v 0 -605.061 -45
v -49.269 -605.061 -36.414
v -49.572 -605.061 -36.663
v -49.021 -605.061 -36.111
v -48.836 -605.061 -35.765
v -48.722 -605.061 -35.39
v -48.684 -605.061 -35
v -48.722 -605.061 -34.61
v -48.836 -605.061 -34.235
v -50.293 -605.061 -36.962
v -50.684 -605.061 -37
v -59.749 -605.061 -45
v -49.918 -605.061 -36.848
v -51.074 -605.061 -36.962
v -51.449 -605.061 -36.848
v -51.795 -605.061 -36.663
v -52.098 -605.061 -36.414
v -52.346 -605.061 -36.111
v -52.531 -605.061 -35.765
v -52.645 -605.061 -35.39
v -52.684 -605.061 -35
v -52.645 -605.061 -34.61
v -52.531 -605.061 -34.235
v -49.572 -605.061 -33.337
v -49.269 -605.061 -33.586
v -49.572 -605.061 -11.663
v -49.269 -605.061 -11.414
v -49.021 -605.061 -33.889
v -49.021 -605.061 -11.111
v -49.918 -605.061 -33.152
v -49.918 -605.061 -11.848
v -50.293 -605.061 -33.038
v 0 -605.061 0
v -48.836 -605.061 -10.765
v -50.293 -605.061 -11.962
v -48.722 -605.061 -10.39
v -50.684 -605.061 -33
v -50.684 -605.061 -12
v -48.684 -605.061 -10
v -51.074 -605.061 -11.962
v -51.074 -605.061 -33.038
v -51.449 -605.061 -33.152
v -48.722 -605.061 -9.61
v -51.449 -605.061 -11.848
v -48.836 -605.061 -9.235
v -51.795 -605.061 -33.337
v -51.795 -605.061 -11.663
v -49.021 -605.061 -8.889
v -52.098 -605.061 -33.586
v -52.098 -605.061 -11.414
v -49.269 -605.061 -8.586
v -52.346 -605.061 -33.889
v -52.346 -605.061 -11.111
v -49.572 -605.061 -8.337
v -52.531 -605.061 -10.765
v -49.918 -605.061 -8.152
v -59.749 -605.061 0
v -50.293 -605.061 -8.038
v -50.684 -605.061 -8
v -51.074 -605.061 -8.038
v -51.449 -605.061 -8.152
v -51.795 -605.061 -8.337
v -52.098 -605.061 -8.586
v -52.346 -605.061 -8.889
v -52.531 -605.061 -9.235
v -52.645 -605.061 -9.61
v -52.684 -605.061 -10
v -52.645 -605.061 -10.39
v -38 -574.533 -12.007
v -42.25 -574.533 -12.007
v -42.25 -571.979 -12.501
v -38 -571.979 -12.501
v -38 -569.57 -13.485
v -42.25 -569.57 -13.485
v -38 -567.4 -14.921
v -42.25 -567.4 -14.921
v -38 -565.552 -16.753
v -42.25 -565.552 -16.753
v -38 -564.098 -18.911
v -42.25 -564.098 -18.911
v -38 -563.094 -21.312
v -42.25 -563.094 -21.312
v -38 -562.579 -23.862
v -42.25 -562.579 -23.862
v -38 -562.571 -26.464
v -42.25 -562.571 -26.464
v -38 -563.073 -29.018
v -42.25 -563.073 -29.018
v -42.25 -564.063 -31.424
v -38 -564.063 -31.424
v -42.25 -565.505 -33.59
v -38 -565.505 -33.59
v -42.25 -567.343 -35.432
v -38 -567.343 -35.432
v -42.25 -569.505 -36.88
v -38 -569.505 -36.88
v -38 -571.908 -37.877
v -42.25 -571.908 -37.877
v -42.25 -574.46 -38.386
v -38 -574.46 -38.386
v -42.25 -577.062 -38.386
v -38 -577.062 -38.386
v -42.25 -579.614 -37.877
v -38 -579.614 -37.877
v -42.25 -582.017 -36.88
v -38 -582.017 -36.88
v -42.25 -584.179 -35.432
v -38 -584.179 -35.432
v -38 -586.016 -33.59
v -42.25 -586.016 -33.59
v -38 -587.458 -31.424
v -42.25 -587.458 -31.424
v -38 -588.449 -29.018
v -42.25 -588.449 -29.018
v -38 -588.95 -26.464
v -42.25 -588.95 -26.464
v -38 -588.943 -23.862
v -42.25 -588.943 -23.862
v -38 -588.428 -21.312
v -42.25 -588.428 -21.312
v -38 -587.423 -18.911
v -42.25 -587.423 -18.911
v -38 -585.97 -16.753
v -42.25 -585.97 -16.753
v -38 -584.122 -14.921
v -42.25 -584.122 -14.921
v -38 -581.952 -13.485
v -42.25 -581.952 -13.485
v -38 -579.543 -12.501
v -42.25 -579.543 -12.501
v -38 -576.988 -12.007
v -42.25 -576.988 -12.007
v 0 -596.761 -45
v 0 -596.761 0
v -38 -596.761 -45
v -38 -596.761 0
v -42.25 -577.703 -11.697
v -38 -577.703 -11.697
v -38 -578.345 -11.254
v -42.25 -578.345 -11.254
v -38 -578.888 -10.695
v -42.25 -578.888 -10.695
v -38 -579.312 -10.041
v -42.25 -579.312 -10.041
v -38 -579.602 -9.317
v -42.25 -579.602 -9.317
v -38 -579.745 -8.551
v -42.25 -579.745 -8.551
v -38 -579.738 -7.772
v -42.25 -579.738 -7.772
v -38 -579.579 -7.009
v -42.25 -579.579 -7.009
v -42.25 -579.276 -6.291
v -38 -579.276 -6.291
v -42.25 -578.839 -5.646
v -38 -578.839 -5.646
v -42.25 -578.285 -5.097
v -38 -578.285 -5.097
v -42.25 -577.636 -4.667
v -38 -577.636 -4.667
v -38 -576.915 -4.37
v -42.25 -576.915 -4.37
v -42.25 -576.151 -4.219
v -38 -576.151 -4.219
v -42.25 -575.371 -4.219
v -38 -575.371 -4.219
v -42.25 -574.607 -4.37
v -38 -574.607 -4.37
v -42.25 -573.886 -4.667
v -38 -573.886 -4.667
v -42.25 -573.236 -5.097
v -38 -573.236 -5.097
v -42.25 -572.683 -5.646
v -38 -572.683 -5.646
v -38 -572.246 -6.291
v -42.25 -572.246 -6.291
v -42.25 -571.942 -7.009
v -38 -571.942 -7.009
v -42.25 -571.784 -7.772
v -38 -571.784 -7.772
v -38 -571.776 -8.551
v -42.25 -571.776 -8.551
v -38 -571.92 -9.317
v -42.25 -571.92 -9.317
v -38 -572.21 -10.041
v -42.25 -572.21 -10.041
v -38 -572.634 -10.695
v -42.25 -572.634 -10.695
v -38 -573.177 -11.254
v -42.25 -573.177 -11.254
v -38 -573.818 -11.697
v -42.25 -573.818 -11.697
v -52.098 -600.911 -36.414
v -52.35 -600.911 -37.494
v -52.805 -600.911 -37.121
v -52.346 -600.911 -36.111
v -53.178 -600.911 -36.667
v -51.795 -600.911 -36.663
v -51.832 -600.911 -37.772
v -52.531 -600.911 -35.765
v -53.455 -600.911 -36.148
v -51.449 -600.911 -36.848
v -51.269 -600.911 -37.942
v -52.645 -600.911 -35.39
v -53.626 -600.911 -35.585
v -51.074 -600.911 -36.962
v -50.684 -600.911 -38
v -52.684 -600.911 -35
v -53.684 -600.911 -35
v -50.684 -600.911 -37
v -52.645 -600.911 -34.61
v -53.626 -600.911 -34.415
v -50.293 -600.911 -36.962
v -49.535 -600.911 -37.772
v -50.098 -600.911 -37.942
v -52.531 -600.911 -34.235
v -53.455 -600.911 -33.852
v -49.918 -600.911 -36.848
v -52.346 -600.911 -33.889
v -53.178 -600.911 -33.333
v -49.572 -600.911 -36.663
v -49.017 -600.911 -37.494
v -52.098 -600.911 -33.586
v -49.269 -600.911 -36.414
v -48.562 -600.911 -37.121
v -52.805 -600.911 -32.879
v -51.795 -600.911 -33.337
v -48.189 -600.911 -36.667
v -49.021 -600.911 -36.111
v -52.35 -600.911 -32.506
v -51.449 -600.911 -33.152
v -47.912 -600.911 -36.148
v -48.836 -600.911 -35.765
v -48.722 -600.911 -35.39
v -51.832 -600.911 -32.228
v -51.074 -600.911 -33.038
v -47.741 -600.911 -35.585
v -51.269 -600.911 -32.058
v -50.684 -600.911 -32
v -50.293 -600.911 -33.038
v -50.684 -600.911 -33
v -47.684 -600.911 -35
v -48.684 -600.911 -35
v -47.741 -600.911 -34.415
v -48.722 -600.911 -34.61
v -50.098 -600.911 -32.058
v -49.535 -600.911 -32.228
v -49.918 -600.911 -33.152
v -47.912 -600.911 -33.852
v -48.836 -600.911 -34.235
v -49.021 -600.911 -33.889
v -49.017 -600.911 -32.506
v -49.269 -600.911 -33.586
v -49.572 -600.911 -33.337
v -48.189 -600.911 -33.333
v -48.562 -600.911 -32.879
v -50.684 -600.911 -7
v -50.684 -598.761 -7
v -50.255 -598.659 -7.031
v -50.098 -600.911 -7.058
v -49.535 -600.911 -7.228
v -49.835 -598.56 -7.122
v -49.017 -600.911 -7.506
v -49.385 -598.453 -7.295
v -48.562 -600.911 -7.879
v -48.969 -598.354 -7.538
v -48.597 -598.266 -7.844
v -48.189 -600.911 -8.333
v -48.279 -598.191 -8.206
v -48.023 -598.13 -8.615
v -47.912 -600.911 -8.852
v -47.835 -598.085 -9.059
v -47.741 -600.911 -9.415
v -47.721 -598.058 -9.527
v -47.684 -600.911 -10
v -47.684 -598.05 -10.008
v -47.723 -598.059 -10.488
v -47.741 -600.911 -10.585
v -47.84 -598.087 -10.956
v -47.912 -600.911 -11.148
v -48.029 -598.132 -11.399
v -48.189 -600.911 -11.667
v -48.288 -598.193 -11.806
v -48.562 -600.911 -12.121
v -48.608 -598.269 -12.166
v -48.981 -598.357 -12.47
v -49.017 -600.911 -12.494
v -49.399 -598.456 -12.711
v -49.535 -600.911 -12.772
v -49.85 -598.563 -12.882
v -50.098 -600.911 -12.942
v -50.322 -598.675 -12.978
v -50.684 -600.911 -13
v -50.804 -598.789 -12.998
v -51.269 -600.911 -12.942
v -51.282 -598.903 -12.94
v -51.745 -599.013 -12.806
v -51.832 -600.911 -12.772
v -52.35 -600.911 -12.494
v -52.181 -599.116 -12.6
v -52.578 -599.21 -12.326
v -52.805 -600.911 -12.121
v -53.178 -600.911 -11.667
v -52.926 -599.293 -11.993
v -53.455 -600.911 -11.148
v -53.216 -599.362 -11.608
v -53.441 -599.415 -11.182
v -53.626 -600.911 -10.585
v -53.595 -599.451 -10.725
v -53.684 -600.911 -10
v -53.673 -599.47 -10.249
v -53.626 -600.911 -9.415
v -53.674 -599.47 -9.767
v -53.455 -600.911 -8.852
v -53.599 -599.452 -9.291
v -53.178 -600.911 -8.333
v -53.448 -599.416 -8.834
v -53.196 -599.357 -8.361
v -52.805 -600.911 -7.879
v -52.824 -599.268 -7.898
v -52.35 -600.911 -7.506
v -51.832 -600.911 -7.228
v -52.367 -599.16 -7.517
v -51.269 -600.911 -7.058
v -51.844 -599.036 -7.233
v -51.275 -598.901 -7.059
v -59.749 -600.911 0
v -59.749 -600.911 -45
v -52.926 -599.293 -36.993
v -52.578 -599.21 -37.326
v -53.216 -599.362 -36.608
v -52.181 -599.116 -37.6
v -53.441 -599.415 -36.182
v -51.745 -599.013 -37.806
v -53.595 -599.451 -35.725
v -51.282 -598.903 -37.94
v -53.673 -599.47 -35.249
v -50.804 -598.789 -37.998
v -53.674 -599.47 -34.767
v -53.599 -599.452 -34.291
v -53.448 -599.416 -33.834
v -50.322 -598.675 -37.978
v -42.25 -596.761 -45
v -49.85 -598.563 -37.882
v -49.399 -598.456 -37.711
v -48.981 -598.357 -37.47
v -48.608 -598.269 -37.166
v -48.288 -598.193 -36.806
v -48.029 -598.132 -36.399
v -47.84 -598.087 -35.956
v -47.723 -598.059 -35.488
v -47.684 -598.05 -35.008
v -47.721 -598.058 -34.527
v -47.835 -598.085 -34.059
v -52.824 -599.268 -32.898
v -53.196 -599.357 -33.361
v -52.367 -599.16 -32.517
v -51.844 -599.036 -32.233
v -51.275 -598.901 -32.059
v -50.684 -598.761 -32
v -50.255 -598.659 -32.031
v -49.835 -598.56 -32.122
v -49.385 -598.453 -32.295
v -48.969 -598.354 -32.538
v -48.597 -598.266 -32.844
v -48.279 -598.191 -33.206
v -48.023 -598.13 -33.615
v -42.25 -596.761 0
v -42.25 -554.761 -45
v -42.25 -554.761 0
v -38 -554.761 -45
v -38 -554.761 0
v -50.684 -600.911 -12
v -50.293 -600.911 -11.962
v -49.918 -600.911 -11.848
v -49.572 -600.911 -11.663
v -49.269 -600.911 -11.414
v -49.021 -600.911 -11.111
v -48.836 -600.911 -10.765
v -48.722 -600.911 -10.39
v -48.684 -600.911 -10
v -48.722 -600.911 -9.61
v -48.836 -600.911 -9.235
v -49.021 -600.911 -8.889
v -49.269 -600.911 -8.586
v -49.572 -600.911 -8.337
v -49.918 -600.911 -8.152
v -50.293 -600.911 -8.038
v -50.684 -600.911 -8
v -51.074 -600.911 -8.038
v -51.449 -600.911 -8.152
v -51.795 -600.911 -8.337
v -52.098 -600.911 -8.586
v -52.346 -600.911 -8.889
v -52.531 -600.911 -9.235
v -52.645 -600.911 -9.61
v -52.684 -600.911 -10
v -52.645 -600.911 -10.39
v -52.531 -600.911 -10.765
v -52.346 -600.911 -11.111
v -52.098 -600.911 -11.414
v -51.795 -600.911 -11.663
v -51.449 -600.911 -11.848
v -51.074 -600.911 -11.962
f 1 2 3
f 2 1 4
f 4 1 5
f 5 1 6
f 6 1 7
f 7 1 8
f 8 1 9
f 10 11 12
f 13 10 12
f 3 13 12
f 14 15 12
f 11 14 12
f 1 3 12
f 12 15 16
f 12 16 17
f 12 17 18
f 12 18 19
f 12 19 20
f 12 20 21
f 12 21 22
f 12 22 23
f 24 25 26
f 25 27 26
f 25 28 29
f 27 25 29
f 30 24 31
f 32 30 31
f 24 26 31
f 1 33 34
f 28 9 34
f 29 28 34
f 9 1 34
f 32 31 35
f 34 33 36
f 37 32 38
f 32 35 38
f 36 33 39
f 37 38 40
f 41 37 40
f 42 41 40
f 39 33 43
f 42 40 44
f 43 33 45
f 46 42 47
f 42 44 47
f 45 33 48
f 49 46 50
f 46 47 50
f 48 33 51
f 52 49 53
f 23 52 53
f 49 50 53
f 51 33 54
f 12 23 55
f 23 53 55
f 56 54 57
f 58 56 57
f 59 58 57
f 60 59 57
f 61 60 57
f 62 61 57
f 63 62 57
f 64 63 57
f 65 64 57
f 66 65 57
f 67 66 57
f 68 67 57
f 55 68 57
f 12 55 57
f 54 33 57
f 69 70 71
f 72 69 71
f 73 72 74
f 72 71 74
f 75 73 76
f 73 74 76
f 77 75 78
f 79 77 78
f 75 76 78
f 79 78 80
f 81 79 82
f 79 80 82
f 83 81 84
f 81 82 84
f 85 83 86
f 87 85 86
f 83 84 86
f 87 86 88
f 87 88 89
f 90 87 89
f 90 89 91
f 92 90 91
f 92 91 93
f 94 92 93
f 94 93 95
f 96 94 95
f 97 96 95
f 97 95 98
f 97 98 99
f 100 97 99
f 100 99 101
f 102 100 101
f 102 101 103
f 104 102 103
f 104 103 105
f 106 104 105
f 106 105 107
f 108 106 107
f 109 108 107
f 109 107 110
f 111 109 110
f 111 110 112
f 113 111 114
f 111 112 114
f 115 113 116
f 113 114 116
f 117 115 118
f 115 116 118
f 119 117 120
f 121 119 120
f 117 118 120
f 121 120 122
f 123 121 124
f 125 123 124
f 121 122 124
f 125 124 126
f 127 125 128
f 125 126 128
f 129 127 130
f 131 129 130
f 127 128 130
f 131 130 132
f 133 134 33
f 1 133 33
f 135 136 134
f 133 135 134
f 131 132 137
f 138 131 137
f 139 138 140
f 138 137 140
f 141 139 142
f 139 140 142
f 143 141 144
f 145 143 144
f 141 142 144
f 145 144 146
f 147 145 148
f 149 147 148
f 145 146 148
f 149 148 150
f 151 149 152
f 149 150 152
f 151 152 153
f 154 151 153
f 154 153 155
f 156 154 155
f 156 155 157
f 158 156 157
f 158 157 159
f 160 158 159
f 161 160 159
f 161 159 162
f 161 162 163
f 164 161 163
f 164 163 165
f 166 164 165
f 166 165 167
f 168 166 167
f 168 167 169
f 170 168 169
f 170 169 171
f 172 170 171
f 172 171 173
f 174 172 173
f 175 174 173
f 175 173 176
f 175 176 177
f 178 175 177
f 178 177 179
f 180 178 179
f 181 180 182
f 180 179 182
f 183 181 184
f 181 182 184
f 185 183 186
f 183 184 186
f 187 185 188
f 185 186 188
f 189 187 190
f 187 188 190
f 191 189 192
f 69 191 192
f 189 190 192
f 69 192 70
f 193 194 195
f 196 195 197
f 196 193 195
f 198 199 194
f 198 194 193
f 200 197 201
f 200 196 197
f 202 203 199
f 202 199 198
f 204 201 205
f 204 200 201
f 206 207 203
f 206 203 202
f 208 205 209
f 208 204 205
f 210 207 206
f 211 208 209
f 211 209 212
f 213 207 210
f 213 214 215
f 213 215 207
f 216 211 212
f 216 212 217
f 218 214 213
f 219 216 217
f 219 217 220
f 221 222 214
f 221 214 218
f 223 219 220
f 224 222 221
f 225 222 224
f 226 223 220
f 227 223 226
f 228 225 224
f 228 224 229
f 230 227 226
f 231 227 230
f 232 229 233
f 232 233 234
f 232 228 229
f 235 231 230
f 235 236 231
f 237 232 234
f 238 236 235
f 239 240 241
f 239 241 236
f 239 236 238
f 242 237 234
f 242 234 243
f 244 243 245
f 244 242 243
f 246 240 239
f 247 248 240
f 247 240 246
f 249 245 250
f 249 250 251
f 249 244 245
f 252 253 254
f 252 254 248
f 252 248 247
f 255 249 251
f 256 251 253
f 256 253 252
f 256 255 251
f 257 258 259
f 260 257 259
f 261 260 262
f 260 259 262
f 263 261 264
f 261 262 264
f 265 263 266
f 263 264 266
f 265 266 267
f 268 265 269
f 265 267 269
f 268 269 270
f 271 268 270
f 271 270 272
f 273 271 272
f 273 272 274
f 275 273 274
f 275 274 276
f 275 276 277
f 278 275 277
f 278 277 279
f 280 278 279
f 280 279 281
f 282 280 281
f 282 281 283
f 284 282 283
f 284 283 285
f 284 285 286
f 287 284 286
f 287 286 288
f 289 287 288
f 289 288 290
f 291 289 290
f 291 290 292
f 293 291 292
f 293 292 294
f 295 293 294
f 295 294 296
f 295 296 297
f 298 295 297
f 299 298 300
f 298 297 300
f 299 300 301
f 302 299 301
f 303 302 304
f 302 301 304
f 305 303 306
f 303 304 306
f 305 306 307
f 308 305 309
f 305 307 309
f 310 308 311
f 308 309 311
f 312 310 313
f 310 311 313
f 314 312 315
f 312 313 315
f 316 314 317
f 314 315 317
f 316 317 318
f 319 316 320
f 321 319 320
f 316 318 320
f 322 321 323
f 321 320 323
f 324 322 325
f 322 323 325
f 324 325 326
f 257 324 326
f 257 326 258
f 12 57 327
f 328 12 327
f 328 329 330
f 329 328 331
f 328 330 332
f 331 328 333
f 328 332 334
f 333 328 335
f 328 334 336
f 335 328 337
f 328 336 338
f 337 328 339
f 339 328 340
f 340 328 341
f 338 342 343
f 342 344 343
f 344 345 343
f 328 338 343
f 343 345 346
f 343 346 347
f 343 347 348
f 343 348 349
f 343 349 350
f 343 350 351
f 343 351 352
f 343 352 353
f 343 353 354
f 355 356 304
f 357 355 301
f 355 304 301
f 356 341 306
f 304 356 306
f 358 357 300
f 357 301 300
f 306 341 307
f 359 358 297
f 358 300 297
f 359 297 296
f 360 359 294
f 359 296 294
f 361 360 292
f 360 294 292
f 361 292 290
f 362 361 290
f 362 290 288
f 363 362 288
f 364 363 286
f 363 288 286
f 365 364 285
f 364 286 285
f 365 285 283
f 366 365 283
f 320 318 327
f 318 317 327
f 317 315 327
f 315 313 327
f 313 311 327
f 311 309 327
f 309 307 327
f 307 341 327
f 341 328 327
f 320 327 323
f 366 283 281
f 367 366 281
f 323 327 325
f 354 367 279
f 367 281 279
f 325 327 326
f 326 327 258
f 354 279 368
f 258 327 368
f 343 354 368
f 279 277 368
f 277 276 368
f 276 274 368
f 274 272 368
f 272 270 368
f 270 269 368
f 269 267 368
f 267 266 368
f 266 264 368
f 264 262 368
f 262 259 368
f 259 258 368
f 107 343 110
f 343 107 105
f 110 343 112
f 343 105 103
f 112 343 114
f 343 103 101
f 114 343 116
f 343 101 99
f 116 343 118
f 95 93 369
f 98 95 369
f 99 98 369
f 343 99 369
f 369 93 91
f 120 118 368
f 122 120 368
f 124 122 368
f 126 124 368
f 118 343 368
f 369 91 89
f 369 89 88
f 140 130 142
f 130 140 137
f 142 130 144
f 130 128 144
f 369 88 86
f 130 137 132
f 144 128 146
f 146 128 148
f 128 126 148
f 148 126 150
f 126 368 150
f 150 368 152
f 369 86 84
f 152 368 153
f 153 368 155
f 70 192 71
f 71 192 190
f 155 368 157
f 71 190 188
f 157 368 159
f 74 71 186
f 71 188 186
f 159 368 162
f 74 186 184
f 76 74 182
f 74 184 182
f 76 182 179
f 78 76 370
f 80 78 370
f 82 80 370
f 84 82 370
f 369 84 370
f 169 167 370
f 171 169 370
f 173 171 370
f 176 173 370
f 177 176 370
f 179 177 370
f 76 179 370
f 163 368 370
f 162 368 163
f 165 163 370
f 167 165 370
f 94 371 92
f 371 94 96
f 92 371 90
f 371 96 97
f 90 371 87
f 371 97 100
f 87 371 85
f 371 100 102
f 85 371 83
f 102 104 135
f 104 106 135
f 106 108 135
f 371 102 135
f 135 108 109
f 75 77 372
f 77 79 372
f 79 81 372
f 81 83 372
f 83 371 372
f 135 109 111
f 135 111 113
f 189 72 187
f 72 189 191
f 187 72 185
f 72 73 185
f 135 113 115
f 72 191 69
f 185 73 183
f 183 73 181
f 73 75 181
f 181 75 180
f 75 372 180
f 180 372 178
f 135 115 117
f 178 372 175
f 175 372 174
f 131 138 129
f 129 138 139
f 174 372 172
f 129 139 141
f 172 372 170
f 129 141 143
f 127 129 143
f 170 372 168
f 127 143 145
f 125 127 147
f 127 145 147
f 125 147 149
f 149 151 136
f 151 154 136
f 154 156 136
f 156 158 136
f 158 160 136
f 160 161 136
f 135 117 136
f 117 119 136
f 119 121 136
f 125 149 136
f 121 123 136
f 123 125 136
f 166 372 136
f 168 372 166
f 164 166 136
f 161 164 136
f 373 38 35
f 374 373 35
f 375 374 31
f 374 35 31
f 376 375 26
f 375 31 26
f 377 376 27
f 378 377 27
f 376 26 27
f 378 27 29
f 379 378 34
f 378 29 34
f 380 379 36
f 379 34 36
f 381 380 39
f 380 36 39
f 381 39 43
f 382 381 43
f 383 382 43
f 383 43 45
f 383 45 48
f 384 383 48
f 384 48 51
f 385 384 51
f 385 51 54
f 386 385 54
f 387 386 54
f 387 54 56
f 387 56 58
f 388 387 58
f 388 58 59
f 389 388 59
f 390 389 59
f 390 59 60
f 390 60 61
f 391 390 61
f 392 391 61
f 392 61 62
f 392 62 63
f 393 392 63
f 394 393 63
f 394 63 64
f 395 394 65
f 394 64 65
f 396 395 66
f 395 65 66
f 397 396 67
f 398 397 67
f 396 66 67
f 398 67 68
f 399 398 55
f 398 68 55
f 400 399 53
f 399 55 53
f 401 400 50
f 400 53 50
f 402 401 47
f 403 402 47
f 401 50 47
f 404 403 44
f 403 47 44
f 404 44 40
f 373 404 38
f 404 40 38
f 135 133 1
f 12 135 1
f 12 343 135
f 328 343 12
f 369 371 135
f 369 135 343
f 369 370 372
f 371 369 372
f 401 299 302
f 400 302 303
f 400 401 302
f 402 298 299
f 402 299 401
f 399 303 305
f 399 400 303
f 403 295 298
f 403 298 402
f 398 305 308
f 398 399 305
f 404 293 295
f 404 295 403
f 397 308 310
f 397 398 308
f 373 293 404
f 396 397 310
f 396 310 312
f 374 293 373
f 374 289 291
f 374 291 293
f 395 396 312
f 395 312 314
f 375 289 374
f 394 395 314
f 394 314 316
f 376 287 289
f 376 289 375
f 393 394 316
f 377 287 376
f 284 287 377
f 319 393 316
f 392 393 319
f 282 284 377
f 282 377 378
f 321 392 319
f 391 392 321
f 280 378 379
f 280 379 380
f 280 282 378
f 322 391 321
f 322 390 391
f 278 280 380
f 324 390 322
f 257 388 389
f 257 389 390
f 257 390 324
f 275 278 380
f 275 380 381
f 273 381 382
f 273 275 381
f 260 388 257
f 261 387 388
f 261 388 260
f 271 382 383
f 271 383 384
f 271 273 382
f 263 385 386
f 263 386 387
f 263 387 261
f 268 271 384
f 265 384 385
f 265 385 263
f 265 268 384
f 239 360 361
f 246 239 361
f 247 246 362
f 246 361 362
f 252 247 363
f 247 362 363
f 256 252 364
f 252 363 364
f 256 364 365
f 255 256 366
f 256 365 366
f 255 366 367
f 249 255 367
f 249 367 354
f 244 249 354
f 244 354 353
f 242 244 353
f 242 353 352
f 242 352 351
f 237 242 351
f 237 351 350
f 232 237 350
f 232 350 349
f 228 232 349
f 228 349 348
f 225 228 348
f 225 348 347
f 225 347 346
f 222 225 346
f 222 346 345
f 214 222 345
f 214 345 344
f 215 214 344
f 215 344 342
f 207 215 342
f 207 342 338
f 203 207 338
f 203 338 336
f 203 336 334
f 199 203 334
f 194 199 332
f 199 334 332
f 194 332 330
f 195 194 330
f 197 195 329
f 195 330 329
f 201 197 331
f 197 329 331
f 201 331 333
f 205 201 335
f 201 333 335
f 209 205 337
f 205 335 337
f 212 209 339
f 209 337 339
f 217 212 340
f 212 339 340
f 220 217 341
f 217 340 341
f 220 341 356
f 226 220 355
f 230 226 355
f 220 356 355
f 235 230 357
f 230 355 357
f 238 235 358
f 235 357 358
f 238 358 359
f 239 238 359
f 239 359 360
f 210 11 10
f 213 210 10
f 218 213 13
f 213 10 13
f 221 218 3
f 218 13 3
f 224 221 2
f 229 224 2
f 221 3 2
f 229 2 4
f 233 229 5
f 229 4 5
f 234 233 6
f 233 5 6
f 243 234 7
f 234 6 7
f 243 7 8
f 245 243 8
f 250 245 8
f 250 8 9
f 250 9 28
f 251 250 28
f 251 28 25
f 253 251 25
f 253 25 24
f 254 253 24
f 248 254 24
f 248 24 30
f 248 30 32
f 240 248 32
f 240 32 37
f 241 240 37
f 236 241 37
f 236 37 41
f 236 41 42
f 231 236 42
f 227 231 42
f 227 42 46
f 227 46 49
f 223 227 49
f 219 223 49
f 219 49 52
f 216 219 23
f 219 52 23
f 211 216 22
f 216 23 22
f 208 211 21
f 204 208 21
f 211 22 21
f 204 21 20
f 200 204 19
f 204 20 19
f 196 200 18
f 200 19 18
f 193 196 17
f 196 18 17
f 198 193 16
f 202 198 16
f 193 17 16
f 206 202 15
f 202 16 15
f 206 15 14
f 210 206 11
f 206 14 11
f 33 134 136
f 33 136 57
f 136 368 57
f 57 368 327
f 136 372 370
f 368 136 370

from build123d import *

# Parameters (mm, degrees)
BOSS_EXTRU_1_DEPTH      = 45
ENL_V_MAT_EXTRU_1_DEPTH = 609.201213002
ESQUISSE3_R             = 2
ENL_V_MAT_EXTRU_2_DEPTH = 91.138958208
ESQUISSE4_R             = 3
ENL_V_MAT_EXTRU_3_DEPTH = 46.15


with BuildPart() as part:
    # Esquisse1 → Boss.-Extru.1 (new body)
    with BuildSketch(Plane.XY):
        Polygon((-38, -554.760879723), (-38, -596.760879723), (0, -596.760879723), (0, -605.060879723), (-59.74898984, -605.060879723), (-59.74898984, -600.910879723), (-42.249820419, -596.760879723), (-42.249820419, -554.760879723), align=None)
    extrude(amount=-BOSS_EXTRU_1_DEPTH)

    # Esquisse2 → Enlèv. mat.-Extru.1 (cut, through all)
    with BuildSketch(Plane.ZY.offset(42.249820419)):
        with BuildLine():
            ThreePointArc((-12.006985294, -576.988423193), (-4.2, -575.760879723), (-12.006985294, -574.533336253))
            ThreePointArc((-12.006985294, -574.533336253), (-38.45, -575.760879723), (-12.006985294, -576.988423193))
        make_face()
    extrude(amount=-ENL_V_MAT_EXTRU_1_DEPTH, mode=Mode.SUBTRACT)

    # Esquisse3 → Enlèv. mat.-Extru.2 (cut, through all)
    with BuildSketch(Plane.XZ.offset(605.060879723)):
        with Locations(Location((-50.683510071, -35, 0), (0, 0, 270))):
            Circle(ESQUISSE3_R)
        with Locations(Location((-50.683510071, -10, 0), (0, 0, 270))):
            Circle(ESQUISSE3_R)
    extrude(amount=-ENL_V_MAT_EXTRU_2_DEPTH, mode=Mode.SUBTRACT)

    # Esquisse4 → Enlèv. mat.-Extru.3 (cut)
    with BuildSketch(Plane(origin=(0, -554.760879723, 0), x_dir=(1, 0, 0), z_dir=(0, 1, 0))):
        with Locations(Location((-50.683510071, 10, 0), (0, 0, 270))):
            Circle(ESQUISSE4_R)
        with Locations(Location((-50.683510071, 35, 0), (0, 0, 270))):
            Circle(ESQUISSE4_R)
    extrude(amount=-ENL_V_MAT_EXTRU_3_DEPTH, mode=Mode.SUBTRACT)


solid = part.part
